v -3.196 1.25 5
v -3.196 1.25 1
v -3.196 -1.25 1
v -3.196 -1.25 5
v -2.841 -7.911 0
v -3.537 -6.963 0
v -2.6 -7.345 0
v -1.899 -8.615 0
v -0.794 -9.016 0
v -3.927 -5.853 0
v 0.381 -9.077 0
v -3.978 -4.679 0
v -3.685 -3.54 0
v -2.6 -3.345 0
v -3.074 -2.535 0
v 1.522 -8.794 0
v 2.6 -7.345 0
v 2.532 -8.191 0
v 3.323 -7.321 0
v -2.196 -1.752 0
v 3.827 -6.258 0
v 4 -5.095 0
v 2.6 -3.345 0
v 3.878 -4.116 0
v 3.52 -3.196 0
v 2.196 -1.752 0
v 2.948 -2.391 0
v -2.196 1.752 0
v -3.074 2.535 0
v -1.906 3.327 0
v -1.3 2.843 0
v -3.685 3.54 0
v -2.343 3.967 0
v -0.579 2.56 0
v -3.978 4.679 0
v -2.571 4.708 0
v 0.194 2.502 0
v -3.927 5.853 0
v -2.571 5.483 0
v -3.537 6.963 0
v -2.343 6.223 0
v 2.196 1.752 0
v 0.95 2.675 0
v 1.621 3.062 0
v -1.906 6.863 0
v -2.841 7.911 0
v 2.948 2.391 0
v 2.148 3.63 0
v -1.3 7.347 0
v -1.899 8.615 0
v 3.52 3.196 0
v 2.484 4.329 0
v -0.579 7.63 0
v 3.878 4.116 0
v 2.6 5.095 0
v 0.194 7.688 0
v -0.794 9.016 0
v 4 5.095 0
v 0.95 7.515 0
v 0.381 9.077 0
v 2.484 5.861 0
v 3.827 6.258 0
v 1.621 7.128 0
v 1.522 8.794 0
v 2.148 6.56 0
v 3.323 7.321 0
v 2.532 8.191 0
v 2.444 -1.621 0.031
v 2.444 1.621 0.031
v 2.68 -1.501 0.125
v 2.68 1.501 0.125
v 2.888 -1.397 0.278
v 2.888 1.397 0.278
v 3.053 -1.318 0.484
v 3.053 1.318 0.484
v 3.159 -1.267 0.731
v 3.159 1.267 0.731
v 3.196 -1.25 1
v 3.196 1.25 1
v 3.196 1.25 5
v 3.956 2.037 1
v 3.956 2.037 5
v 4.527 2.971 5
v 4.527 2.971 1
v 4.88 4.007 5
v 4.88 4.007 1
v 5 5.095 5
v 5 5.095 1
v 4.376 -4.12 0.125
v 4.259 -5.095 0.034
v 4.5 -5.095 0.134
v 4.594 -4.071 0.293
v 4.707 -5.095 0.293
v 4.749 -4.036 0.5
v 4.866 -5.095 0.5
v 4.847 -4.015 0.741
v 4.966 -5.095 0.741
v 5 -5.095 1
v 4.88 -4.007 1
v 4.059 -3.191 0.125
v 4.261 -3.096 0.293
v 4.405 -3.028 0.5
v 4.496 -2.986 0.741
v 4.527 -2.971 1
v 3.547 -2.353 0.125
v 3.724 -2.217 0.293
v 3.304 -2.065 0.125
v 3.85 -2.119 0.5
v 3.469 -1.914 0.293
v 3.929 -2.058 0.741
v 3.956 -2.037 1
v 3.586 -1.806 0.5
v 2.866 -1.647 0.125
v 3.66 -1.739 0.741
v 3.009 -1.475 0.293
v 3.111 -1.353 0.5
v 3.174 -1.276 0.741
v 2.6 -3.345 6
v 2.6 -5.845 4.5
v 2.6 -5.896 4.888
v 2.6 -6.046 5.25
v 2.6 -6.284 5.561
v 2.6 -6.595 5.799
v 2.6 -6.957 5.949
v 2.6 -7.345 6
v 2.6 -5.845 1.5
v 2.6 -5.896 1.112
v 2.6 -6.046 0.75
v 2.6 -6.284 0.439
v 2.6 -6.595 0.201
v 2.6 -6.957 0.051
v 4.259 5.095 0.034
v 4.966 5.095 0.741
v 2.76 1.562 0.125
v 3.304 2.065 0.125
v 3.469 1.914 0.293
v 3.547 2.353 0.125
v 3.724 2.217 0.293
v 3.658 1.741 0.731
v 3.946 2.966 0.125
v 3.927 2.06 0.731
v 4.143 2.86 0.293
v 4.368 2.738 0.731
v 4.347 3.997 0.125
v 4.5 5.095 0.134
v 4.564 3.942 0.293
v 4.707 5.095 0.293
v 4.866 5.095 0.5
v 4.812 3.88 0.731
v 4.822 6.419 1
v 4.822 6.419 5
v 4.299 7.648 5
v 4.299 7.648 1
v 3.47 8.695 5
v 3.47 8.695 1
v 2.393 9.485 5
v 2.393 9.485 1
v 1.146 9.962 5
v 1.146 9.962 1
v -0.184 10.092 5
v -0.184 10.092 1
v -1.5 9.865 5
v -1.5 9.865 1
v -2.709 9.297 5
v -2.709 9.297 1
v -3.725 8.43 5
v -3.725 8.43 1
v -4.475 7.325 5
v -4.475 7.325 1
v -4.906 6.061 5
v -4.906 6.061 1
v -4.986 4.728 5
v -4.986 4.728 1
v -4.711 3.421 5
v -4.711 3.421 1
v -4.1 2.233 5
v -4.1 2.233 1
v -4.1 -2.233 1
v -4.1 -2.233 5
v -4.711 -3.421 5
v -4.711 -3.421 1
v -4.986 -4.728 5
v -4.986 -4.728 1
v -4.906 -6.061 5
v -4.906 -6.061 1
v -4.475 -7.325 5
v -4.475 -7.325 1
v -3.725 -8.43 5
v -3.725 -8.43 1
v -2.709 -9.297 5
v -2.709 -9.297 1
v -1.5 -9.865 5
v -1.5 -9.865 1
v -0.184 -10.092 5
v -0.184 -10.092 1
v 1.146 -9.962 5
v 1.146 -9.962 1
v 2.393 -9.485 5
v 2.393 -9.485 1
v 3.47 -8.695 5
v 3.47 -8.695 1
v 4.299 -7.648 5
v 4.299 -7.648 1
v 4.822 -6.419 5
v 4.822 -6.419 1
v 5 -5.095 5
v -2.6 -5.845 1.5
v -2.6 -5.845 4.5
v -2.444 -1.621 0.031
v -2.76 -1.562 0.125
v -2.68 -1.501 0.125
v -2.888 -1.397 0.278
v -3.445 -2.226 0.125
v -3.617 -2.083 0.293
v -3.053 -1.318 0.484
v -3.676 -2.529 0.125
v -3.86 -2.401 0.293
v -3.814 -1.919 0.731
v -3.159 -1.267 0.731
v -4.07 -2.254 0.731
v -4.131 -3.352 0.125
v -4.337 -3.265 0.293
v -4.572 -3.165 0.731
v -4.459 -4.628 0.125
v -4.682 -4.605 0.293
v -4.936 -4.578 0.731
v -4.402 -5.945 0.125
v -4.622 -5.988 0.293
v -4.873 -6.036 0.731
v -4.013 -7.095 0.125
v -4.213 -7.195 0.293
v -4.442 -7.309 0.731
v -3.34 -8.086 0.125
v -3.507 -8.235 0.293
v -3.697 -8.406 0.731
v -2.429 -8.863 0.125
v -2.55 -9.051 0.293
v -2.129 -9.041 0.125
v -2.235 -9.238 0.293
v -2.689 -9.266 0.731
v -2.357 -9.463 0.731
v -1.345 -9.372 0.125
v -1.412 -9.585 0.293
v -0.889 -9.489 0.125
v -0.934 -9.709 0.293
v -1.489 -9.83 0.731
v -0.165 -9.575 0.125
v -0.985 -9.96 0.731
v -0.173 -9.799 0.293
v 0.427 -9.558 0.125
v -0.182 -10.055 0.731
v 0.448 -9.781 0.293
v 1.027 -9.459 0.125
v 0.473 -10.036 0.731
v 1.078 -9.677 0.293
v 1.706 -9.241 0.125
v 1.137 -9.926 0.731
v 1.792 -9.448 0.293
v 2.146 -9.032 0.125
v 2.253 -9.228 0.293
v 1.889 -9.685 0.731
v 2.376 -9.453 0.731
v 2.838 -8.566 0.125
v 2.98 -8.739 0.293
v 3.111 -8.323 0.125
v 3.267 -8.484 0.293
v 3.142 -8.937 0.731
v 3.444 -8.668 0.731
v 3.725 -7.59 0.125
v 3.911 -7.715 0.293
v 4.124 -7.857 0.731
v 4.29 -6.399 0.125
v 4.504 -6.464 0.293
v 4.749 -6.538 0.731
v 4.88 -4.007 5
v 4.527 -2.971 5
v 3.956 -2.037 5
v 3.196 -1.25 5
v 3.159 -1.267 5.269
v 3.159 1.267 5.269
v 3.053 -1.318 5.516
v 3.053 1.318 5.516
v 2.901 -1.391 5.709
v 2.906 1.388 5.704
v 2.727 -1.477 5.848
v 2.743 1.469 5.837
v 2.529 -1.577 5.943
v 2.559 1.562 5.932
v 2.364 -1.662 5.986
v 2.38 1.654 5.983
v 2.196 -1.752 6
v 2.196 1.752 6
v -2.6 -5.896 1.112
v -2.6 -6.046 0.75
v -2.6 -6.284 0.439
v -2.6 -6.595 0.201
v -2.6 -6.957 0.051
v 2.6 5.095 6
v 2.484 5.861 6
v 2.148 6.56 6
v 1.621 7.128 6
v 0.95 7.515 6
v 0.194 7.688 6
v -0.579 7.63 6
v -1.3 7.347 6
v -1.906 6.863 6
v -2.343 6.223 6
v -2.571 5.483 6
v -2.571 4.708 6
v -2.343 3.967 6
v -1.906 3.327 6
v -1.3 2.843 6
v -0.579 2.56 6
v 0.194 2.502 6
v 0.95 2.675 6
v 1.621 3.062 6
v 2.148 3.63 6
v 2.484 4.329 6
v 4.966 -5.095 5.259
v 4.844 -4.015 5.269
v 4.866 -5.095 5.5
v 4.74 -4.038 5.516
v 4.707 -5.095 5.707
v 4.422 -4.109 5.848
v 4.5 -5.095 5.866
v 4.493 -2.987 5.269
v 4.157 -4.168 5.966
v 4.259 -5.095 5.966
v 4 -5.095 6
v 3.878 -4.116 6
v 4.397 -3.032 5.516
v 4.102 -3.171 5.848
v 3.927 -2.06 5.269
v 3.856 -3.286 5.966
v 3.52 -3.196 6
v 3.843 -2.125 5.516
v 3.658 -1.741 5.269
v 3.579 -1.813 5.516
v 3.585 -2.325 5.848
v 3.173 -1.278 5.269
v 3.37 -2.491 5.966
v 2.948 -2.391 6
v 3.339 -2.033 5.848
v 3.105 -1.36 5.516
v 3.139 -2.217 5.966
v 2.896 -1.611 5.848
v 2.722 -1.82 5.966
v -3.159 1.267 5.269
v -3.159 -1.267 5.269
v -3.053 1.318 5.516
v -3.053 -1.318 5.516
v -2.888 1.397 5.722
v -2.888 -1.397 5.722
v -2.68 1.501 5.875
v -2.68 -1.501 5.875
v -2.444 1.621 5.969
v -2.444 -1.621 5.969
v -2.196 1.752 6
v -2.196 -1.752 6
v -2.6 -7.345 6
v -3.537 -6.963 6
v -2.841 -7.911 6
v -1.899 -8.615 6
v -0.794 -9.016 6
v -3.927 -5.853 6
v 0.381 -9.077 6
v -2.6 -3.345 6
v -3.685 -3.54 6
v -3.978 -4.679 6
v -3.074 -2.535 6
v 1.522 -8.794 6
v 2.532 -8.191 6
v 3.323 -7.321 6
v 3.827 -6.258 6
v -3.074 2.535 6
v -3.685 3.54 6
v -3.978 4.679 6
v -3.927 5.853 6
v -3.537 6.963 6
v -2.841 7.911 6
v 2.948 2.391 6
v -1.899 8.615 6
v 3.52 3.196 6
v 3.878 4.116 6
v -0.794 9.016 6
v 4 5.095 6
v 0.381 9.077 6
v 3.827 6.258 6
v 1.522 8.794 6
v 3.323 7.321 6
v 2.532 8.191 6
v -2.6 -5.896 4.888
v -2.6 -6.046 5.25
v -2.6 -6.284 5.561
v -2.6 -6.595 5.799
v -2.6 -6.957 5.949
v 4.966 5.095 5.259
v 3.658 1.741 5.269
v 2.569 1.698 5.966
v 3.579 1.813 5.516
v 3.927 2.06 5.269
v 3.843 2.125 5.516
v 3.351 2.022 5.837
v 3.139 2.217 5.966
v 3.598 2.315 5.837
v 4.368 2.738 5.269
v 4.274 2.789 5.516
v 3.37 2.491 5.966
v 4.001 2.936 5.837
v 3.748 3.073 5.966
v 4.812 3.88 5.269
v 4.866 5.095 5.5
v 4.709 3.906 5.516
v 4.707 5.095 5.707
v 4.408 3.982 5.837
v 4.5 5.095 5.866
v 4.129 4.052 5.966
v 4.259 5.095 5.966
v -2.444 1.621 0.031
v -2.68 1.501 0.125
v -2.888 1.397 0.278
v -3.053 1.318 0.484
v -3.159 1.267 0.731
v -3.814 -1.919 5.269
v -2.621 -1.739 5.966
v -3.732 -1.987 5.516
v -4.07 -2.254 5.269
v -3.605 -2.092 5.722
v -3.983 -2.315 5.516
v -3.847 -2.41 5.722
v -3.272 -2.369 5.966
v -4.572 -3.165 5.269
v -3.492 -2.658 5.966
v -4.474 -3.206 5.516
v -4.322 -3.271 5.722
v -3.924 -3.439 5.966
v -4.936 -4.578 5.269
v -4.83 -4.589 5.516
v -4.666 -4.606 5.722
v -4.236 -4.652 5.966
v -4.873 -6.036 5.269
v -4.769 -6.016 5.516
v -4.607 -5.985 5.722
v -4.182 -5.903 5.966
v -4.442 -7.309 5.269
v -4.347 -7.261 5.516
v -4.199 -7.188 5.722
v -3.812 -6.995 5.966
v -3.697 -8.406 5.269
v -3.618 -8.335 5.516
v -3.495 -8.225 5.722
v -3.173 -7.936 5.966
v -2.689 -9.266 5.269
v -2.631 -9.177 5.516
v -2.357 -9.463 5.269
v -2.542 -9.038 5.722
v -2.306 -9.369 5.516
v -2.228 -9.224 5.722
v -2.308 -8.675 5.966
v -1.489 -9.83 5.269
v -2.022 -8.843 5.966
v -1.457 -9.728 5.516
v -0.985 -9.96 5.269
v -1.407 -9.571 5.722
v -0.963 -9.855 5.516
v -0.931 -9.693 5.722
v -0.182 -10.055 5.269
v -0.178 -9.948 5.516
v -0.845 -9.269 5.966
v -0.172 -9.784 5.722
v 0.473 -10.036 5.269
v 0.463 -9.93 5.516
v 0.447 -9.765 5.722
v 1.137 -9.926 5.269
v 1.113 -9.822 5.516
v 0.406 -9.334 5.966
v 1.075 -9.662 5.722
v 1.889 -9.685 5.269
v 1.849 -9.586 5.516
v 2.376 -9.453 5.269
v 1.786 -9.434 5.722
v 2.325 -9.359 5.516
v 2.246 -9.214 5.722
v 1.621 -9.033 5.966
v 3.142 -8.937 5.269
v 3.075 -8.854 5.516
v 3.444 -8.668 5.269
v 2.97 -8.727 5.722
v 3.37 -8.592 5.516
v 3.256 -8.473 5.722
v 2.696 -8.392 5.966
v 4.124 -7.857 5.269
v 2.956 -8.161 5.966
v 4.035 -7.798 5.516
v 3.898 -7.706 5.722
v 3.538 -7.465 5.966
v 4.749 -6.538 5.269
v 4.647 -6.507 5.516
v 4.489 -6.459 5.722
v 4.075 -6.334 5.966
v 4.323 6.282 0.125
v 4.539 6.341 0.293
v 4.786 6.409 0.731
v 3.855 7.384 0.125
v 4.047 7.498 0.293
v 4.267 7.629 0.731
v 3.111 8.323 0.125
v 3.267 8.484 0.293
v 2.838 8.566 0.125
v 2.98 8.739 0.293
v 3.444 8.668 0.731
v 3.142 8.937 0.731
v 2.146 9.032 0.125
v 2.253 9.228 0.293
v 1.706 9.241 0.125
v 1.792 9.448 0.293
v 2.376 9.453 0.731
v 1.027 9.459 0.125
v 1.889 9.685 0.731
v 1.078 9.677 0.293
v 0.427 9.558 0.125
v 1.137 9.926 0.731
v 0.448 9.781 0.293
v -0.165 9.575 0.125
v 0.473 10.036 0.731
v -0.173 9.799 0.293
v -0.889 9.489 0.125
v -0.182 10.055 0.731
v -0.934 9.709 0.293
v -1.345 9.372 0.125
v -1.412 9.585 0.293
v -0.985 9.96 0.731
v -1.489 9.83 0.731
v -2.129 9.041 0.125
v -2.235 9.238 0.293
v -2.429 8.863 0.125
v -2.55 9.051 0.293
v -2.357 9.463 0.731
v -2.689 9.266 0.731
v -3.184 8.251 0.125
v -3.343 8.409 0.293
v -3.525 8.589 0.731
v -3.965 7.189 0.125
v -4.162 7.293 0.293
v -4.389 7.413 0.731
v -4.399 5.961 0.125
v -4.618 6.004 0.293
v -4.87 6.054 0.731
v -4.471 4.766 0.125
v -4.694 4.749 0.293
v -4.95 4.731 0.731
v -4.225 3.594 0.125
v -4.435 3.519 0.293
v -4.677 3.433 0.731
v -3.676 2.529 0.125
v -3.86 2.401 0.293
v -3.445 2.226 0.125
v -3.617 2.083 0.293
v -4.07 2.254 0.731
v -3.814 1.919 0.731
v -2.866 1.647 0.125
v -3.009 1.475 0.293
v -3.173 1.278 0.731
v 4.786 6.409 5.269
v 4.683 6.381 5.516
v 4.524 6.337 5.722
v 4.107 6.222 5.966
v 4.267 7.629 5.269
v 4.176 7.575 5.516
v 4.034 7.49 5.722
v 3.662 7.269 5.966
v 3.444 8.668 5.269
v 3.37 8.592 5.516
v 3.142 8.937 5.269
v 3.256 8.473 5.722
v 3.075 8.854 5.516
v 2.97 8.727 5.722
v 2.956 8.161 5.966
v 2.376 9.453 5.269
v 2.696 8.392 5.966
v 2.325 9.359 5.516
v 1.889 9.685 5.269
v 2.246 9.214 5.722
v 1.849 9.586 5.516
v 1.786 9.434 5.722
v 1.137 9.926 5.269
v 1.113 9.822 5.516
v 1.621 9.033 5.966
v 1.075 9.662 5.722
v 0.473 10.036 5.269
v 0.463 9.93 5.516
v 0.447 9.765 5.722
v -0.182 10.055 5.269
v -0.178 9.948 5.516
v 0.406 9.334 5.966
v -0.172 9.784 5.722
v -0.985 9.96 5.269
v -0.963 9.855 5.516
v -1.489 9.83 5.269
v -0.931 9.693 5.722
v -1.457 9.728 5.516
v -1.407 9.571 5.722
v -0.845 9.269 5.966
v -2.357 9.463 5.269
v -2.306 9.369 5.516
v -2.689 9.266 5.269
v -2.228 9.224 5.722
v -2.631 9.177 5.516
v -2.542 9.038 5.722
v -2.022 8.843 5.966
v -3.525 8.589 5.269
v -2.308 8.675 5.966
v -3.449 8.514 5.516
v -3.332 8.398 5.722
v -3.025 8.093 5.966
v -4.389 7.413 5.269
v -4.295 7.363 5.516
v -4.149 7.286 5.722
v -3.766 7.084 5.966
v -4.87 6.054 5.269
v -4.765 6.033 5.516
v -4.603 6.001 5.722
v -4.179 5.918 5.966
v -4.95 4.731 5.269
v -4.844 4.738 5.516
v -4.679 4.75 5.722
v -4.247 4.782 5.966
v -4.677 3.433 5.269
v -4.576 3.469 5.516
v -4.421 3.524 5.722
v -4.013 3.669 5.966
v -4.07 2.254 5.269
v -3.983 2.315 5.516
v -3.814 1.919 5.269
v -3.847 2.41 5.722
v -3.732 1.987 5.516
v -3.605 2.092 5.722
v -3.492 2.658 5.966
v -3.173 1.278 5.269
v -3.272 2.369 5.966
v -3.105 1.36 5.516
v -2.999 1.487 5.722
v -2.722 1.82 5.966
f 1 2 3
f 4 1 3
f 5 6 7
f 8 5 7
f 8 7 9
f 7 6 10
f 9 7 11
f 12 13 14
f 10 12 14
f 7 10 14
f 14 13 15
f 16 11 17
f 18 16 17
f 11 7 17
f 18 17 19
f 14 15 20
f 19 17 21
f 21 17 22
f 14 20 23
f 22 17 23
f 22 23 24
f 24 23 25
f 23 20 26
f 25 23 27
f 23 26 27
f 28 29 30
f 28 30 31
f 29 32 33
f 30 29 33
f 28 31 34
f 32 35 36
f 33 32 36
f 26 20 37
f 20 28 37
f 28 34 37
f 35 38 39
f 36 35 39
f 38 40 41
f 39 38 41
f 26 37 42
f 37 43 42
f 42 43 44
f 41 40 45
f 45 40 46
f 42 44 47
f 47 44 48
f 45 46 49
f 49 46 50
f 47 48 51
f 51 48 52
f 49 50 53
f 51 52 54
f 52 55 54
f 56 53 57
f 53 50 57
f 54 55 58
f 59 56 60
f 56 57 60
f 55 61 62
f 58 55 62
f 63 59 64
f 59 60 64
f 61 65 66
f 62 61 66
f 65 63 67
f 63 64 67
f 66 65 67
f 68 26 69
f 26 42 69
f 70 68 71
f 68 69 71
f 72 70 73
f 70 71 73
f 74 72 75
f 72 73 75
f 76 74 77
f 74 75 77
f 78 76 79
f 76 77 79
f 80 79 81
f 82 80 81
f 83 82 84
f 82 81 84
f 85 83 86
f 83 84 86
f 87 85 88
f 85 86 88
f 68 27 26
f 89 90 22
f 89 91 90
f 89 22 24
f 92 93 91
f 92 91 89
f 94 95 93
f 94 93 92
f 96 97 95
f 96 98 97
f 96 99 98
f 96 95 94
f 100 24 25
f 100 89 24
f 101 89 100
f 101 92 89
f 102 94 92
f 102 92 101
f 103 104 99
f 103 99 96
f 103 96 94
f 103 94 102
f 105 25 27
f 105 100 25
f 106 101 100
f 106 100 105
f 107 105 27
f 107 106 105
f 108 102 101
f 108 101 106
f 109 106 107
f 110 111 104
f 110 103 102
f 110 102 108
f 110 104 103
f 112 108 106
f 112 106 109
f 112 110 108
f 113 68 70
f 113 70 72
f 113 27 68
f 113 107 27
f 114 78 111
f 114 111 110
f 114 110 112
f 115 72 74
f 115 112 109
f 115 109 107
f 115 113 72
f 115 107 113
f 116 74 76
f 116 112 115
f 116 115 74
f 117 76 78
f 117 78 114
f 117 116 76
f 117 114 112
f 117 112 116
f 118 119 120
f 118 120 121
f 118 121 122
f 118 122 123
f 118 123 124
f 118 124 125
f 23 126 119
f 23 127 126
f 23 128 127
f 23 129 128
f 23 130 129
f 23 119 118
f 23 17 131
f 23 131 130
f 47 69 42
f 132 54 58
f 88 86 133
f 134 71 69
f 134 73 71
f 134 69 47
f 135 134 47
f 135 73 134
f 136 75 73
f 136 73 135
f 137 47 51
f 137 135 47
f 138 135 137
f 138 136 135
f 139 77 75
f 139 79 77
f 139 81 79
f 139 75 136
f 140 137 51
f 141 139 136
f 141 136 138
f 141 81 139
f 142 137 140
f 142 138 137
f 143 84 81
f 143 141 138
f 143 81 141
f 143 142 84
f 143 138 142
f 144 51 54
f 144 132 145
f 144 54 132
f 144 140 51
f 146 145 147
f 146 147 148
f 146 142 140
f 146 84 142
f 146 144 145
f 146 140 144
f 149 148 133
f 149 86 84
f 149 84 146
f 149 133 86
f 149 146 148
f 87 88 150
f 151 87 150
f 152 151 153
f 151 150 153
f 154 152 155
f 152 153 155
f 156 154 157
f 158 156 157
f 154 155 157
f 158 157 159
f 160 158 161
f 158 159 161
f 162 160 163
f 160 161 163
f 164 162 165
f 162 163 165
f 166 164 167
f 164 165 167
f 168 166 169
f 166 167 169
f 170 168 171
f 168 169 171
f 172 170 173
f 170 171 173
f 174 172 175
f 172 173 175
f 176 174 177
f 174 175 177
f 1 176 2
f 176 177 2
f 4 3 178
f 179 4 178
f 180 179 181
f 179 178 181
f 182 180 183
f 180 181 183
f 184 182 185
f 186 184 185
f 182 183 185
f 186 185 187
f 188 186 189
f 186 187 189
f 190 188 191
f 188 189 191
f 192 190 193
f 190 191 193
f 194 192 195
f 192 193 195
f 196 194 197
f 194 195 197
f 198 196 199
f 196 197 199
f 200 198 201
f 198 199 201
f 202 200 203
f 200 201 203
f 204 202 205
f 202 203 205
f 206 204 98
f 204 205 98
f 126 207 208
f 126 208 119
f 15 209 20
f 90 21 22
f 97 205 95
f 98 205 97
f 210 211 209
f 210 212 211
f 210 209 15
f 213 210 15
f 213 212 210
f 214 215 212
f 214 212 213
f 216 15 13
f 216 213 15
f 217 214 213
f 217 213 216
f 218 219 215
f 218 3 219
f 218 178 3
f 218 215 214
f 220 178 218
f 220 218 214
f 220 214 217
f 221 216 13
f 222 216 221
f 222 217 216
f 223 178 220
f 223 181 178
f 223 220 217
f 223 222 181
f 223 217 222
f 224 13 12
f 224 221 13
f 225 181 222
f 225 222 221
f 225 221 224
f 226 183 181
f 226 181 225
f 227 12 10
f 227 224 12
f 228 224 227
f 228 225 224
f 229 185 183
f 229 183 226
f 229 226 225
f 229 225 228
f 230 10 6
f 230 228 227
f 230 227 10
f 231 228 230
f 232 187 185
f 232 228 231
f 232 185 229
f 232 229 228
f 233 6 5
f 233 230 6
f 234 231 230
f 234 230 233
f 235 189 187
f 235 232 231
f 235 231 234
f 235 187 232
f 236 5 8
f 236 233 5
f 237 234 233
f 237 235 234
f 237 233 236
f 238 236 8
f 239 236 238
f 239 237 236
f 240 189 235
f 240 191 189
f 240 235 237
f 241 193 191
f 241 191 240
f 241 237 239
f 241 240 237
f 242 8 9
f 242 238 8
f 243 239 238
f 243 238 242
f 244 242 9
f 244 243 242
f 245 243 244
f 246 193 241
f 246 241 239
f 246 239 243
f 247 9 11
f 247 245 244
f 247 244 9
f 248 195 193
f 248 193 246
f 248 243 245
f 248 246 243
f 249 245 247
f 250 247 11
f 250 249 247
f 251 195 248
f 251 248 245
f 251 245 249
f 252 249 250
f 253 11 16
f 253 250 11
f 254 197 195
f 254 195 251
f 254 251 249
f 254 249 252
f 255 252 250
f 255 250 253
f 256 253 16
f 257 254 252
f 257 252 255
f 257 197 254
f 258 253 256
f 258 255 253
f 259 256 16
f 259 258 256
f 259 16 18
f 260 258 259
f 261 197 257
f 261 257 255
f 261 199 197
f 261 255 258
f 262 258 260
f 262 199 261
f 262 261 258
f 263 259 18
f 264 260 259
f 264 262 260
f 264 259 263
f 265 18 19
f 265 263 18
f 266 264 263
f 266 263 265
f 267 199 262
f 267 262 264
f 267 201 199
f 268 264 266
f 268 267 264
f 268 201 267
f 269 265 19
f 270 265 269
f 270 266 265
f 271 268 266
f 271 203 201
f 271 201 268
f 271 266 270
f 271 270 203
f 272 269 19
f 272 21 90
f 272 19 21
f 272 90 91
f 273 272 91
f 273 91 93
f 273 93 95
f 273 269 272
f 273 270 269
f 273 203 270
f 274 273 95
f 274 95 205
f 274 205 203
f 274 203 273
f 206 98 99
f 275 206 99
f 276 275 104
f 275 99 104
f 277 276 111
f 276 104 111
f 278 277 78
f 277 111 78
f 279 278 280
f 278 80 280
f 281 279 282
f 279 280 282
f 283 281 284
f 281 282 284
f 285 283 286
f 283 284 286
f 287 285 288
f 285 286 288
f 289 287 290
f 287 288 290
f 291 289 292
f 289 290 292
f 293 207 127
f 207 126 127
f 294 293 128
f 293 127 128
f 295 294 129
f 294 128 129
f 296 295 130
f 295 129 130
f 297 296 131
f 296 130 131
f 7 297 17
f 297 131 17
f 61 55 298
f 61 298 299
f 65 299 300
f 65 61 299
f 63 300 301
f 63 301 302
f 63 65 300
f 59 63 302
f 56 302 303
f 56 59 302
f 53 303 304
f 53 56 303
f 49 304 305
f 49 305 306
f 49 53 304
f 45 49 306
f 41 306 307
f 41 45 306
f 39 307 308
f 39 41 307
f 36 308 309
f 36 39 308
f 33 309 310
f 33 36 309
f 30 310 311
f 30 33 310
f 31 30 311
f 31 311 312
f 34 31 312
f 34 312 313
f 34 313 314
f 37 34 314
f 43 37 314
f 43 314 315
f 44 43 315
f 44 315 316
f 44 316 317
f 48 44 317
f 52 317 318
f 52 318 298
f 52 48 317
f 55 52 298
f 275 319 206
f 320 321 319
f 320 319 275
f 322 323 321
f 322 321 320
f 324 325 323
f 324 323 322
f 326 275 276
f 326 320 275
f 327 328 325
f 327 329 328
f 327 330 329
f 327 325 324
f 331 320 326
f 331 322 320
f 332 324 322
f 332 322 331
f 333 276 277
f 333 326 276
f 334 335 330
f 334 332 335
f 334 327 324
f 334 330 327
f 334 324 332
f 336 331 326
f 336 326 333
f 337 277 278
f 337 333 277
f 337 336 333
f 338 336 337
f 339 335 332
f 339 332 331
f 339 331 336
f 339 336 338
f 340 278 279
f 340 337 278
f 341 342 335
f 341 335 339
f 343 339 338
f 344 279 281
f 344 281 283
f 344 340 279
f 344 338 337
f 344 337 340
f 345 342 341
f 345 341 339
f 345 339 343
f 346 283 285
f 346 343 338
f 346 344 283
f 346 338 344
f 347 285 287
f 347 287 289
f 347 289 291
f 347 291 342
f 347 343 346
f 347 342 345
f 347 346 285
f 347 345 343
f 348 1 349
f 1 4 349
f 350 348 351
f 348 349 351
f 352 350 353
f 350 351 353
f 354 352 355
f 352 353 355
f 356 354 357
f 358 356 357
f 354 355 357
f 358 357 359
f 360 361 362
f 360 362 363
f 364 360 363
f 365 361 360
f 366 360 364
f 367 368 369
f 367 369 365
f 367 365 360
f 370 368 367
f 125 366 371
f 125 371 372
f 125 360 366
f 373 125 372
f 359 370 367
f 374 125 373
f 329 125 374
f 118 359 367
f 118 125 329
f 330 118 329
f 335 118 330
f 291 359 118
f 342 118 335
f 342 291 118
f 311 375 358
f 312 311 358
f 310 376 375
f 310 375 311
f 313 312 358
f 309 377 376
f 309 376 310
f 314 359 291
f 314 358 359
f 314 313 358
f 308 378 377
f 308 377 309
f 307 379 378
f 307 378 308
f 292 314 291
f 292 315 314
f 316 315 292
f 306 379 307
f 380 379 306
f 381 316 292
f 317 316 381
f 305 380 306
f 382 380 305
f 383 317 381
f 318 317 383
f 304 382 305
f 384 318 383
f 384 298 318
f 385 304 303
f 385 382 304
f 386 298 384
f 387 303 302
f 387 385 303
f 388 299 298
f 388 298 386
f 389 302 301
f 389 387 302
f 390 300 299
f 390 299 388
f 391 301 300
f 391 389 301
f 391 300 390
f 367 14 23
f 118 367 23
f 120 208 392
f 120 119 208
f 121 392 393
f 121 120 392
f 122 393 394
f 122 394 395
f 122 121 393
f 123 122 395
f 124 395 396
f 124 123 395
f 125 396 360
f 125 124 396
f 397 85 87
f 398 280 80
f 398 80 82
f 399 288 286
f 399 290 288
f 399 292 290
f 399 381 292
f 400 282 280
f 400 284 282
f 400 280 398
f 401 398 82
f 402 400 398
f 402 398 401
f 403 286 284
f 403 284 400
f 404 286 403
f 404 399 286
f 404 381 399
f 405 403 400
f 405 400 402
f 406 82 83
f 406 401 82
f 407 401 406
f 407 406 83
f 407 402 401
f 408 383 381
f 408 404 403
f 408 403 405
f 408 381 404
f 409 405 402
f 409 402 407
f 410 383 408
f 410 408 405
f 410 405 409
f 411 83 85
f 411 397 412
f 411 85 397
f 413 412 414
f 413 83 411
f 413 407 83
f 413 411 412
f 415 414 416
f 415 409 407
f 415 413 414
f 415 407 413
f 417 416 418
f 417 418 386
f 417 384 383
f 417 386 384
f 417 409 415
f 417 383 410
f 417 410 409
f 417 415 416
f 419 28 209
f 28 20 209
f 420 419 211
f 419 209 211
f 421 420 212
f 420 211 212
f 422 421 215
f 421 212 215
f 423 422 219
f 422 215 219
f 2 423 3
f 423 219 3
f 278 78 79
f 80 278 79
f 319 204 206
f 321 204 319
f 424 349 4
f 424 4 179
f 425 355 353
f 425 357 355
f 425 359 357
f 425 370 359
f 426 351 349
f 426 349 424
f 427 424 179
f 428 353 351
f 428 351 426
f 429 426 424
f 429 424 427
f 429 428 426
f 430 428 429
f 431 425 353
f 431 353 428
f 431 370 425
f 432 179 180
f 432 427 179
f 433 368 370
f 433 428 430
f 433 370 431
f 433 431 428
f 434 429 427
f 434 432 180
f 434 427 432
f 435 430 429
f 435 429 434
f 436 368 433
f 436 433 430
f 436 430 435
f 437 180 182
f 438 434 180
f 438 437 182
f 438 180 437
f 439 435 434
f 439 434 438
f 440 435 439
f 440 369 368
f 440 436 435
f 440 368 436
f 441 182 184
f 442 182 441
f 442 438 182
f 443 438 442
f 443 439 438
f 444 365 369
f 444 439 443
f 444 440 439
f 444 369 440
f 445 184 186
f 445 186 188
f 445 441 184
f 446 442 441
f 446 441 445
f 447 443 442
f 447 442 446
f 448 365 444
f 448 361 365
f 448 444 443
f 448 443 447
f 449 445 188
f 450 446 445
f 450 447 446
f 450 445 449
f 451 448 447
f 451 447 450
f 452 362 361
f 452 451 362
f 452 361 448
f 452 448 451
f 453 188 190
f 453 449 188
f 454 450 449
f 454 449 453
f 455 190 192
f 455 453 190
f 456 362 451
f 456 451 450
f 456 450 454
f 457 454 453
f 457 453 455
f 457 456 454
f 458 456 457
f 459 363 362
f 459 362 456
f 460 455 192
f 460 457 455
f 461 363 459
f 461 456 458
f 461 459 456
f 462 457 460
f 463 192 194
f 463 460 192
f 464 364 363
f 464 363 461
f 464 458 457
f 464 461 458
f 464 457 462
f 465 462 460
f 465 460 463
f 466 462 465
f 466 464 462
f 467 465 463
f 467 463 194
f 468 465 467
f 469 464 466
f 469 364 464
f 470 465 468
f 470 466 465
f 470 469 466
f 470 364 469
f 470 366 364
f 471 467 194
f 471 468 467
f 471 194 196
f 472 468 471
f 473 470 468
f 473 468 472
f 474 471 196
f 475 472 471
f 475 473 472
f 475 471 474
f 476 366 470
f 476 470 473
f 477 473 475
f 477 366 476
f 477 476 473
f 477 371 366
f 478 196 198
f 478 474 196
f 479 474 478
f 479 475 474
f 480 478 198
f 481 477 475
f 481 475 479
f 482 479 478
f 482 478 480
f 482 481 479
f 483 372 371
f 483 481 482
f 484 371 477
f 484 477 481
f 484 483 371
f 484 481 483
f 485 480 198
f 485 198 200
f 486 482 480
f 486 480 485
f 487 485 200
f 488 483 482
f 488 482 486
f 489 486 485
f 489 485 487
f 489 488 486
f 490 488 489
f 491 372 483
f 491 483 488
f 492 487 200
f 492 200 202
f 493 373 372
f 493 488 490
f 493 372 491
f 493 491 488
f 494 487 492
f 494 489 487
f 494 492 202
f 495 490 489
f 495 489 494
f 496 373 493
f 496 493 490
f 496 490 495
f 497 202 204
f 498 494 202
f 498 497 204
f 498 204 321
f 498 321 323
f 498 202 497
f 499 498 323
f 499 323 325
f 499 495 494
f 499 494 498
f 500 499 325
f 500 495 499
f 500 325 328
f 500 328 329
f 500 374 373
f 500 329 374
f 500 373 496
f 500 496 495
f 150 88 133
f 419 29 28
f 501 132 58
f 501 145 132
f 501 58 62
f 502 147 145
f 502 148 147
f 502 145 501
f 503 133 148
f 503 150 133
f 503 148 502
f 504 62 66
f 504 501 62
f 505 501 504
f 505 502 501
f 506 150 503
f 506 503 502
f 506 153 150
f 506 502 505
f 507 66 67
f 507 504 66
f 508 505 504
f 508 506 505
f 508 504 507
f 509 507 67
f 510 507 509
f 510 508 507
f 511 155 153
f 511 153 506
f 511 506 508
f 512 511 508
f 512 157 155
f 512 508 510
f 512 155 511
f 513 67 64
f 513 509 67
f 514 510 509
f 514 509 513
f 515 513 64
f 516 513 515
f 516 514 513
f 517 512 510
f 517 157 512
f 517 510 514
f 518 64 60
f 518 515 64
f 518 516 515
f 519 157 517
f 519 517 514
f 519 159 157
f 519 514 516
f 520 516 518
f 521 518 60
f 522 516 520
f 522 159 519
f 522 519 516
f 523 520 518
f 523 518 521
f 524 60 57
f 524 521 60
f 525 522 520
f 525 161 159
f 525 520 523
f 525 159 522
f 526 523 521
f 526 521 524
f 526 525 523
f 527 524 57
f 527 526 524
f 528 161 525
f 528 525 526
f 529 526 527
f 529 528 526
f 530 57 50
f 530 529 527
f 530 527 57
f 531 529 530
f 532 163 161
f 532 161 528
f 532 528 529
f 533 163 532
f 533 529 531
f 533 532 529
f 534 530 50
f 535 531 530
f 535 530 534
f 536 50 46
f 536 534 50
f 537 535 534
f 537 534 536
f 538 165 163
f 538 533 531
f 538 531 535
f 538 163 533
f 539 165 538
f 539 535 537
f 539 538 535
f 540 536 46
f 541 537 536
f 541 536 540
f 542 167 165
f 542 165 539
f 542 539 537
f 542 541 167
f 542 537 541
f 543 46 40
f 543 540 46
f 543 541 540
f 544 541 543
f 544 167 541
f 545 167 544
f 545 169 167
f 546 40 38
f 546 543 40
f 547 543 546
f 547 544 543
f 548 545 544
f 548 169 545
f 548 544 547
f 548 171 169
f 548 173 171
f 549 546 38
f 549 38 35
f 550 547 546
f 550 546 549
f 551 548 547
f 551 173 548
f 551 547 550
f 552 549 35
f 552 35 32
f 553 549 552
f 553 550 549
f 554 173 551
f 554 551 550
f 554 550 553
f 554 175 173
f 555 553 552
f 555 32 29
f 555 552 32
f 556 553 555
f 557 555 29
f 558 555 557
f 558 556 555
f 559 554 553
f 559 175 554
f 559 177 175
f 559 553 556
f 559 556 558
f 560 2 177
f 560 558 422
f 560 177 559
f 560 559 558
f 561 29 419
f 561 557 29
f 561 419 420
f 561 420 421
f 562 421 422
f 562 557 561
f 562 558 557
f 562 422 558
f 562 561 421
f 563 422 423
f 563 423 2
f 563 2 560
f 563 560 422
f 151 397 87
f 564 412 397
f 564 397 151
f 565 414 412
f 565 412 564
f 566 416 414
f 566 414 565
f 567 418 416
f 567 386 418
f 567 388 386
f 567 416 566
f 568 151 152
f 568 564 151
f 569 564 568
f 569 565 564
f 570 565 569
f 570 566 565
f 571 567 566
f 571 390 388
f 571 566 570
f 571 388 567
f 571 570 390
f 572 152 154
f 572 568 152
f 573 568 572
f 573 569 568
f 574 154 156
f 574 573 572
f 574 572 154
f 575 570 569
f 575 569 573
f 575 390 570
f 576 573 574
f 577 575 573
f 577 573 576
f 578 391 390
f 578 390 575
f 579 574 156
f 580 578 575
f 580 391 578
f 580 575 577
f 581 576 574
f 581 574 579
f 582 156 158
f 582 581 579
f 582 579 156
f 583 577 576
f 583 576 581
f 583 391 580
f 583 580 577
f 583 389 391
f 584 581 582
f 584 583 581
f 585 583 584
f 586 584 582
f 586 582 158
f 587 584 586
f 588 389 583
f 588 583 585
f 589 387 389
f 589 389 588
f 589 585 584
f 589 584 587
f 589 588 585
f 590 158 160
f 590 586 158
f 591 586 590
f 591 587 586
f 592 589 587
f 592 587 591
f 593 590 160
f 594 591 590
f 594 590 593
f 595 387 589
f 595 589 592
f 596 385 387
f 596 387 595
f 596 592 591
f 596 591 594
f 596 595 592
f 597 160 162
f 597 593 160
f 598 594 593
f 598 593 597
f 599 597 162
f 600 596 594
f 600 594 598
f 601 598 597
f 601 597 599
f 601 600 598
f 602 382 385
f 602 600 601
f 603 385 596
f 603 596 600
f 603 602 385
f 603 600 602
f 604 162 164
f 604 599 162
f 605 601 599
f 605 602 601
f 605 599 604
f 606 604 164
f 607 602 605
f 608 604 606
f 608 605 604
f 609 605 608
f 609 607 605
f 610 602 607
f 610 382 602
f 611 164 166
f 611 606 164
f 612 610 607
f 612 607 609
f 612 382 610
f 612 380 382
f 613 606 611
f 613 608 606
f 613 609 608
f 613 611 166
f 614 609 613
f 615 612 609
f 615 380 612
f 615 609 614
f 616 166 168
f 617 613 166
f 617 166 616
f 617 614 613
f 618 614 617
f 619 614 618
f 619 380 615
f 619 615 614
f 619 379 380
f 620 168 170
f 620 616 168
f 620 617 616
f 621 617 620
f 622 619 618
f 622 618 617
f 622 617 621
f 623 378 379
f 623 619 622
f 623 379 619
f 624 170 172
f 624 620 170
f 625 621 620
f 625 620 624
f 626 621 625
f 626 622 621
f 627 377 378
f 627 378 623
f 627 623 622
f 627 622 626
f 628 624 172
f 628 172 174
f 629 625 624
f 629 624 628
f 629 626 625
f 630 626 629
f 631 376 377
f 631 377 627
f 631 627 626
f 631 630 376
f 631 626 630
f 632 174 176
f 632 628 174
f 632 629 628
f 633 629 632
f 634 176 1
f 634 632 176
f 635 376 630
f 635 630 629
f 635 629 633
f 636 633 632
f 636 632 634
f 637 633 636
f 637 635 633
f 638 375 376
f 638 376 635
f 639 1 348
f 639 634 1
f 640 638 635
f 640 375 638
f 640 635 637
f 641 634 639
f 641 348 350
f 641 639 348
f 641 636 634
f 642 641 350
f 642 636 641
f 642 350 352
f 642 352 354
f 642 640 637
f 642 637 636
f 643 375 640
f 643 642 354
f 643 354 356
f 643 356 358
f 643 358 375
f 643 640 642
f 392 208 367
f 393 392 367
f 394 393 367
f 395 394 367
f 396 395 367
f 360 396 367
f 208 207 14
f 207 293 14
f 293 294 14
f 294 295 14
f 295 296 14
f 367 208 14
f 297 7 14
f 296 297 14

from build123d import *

# Parameters (mm, degrees)
F0_R     = 2.6
F0_W     = 5.2
F0_H     = 2.5
F1_DEPTH = 6
F2_R     = 1.5
F3_R     = 1


with BuildPart() as f1:
    # F0 (on Top) → F1 (new body)
    with BuildSketch(Plane.XY):
        with BuildLine():
            ThreePointArc((3.196213, 1.25), (4.526647, 2.971475), (5, 5.095026))
            ThreePointArc((5, 5.095026), (-2.123551, 9.621673), (-3.196213, 1.25))
            ThreePointArc((-3.196213, 1.25), (0, 0.095026), (3.196213, 1.25))
        make_face()
        with Locations((0, 5.095026)):
            Circle(F0_R, mode=Mode.SUBTRACT)
        with BuildLine():
            ThreePointArc((3.196213, 1.25), (0, 0.095026), (-3.196213, 1.25))
            Line((-3.196213, 1.25), (-3.196213, 0))
            Line((-3.196213, 0), (0, 0))
            Line((0, 0), (3.196213, 0))
            Line((3.196213, 0), (3.196213, 1.25))
        make_face()
        with BuildLine():
            Line((0, 0), (-3.196213, 0))
            Line((-3.196213, 0), (-3.196213, -1.25))
            ThreePointArc((-3.196213, -1.25), (0, -0.095026), (3.196213, -1.25))
            Line((3.196213, -1.25), (3.196213, 0))
            Line((3.196213, 0), (0, 0))
        make_face()
        with BuildLine():
            ThreePointArc((3.196213, -1.25), (0, -0.095026), (-3.196213, -1.25))
            ThreePointArc((-3.196213, -1.25), (-2.123551, -9.621673), (5, -5.095026))
            ThreePointArc((5, -5.095026), (4.526647, -2.971475), (3.196213, -1.25))
        make_face()
        with Locations((0, -4.595026)):
            Rectangle(F0_W, F0_H, mode=Mode.SUBTRACT)
    extrude(amount=F1_DEPTH)

    # F2
    f2_edges = [f1.edges().sort_by_distance(p)[0] for p in [
        (0, -5.845026, 6),
        (0, -5.845026, 0),
    ]]
    fillet(f2_edges, radius=F2_R)

    # F3
    f3_edges = [f1.edges().sort_by_distance(p)[0] for p in [
        (-3.196213, 0, 6),
        (0, 10.095026, 6),
        (3.196213, 0, 6),
        (0, -10.095026, 6),
        (0, 10.095026, 0),
        (3.196213, 0, 0),
        (-3.196213, 0, 0),
        (0, -10.095026, 0),
    ]]
    fillet(f3_edges, radius=F3_R)


solid = f1.part
